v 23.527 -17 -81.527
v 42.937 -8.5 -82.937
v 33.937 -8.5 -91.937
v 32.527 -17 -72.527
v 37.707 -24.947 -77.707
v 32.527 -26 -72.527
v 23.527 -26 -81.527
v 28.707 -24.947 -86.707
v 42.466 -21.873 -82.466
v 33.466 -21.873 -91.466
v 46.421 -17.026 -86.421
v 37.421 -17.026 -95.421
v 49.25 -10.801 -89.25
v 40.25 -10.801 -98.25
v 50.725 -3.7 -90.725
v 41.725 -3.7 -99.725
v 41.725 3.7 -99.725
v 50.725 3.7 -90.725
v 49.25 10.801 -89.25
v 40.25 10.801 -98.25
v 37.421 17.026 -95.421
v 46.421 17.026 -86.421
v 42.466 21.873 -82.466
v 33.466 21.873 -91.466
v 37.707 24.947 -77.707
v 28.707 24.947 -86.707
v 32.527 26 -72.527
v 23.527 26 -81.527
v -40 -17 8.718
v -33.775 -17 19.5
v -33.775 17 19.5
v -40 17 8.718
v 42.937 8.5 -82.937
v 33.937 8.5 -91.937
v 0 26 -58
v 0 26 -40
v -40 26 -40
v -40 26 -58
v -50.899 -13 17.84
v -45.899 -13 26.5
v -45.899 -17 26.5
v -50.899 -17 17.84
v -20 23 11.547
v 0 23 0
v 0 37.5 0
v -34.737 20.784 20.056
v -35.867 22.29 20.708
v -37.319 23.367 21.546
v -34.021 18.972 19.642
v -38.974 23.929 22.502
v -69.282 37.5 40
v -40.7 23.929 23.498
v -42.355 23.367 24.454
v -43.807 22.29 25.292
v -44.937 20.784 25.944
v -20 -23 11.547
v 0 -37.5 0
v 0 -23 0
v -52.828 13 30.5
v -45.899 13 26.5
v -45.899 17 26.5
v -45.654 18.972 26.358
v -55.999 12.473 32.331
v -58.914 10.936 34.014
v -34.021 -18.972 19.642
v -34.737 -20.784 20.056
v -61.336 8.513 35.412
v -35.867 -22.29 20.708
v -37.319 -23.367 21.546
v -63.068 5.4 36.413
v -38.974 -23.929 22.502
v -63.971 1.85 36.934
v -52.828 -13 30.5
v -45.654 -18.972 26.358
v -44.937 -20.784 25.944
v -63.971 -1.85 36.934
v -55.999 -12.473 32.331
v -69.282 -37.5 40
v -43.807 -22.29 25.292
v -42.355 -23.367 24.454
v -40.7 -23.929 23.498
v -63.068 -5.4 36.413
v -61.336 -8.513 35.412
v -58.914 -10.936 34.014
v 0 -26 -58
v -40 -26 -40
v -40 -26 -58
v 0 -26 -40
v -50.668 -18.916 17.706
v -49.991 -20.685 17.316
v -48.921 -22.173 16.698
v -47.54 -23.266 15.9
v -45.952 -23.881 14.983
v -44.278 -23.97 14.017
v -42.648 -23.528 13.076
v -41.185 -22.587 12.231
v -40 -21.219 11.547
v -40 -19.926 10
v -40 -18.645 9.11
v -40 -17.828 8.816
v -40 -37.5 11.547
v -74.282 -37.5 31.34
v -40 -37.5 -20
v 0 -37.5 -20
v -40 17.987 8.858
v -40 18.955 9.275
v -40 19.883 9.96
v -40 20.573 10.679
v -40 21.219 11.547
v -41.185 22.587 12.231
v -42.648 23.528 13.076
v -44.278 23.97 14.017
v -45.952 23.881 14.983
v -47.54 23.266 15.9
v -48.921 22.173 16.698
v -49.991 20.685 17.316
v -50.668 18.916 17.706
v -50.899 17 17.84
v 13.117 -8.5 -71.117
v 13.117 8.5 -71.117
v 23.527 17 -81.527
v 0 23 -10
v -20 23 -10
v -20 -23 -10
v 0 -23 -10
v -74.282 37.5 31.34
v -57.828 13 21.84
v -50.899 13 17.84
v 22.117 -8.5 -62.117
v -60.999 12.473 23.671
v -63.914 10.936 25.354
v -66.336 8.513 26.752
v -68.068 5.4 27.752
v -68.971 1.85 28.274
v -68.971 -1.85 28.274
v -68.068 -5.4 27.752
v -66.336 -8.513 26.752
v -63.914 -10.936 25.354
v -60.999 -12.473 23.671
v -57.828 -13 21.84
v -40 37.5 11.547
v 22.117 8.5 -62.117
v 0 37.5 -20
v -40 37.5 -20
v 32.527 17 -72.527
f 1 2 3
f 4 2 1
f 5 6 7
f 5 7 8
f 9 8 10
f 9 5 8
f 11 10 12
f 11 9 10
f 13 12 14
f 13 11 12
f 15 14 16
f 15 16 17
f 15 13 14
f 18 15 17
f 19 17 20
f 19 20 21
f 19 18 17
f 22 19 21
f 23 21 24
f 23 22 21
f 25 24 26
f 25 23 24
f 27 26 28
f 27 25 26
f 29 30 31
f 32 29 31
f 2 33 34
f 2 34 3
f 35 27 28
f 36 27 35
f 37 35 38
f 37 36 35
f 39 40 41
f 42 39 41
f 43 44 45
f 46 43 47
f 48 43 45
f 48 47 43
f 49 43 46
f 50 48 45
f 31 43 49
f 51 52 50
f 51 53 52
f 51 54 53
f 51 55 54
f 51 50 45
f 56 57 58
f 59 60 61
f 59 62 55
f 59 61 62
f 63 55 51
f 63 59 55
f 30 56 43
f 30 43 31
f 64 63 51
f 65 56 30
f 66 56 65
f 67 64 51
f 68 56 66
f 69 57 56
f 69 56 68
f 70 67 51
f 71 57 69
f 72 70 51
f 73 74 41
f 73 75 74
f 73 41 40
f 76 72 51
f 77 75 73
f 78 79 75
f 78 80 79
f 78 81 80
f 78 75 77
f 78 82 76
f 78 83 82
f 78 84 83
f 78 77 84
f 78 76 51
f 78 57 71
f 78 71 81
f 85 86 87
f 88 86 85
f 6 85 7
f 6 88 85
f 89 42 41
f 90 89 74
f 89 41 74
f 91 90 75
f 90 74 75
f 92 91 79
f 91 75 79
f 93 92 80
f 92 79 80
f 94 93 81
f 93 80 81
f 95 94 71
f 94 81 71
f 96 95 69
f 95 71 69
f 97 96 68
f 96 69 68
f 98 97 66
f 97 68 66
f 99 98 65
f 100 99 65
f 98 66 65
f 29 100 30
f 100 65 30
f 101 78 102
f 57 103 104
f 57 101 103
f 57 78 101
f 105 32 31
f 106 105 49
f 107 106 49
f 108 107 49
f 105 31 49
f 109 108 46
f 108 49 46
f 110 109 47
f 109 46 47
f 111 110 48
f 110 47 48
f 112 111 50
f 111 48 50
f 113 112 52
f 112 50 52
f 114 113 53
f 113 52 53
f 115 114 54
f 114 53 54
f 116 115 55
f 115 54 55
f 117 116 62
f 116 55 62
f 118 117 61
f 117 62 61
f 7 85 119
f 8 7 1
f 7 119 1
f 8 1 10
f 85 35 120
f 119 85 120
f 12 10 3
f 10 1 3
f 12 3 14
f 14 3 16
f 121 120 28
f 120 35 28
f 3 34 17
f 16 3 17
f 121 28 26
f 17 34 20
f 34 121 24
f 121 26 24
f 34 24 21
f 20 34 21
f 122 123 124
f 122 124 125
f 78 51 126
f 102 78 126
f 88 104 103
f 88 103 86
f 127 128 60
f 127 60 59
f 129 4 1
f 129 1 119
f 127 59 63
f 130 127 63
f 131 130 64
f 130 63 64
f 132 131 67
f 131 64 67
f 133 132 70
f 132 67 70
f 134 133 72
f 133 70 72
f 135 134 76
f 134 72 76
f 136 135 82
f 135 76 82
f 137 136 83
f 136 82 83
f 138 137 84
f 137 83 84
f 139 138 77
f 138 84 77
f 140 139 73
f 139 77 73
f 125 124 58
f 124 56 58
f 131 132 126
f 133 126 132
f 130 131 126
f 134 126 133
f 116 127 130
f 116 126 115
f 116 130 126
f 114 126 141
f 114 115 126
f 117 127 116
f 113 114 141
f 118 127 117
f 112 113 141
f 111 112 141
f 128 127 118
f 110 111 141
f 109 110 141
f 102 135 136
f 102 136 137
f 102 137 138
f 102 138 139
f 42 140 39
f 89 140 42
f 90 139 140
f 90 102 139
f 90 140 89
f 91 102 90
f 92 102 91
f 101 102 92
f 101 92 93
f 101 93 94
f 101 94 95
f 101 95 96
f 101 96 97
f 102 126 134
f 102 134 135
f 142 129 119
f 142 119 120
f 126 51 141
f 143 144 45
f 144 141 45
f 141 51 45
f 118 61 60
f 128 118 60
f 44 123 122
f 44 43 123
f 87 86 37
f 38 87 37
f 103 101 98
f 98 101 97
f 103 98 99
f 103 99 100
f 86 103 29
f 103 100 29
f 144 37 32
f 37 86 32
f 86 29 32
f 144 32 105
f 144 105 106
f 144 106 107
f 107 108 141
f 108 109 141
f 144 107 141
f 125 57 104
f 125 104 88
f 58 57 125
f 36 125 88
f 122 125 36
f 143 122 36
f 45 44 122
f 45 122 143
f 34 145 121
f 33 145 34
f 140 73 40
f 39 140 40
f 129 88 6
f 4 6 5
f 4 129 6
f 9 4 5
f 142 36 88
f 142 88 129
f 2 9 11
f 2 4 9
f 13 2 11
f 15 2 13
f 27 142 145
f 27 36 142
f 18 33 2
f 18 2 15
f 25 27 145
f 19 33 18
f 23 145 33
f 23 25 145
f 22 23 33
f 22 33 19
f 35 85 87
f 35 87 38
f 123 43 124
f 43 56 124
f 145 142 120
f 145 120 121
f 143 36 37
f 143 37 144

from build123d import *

# Parameters (mm, degrees)
F1_DEPTH = 37.5
F2_DEPTH = 23
F4_DEPTH = 40
F7_DEPTH = 12.7279220614
F9_DEPTH = 123.6680763069


with BuildPart() as f1:
    # F0 (on Front) → F1 (new body, symmetric)
    with BuildSketch(Plane.XZ):
        Polygon((-40, -20), (0, -20), (0, -10), (-20, -10), (-20, 11.5470053838), (-69.2820323028, 40), (-74.2820323028, 31.3397459622), (-40, 11.5470053838), align=None)
        Polygon((-20, -10), (0, -10), (0, 0), (-20, 11.5470053838), align=None)
    extrude(amount=F1_DEPTH, both=True)

    # F0 (on Front) → F2 (cut, symmetric)
    with BuildSketch(Plane.XZ):
        Polygon((-20, -10), (0, -10), (0, 0), (-20, 11.5470053838), align=None)
    extrude(amount=F2_DEPTH, both=True, mode=Mode.SUBTRACT)

    # F3 (on Right) → F4 (join)
    with BuildSketch(Plane.YZ):
        Polygon((37.5, -20), (-37.5, -20), (-26, -40), (26, -40), align=None)
        Polygon((26, -40), (-26, -40), (-26, -58), (0, -58), (26, -58), align=None)
    extrude(amount=-F4_DEPTH)

    # F6 (on line) → F7 (join, through all)
    with BuildSketch(Plane(origin=(-20, 0, -20), x_dir=(0.7071067812, 0, -0.7071067812), z_dir=(0.7071067812, 0, 0.7071067812))):
        with BuildLine():
            Line((74.2842712475, 26), (28.2842712475, 26))
            Line((28.2842712475, 26), (28.2842712475, -26))
            Line((28.2842712475, -26), (74.2842712475, -26))
            ThreePointArc((74.2842712475, -26), (100.2842712475, 0), (74.2842712475, 26))
        make_face()
        Polygon((59.5618393831, 8.5), (74.2842712475, 17), (89.0067031118, 8.5), (89.0067031118, -8.5), (74.2842712475, -17), (59.5618393831, -8.5), align=None, mode=Mode.SUBTRACT)
    extrude(amount=-F7_DEPTH)

    # F8 (on face) → F9 (cut, through all)
    with BuildSketch(Plane(origin=(0, 0, 0), x_dir=(0.8660254038, 0, -0.5), z_dir=(0.5, 0, 0.8660254038))):
        with BuildLine():
            ThreePointArc((-53, -17), (-46, -24), (-39, -17))
            Line((-39, -17), (-39, 17))
            ThreePointArc((-39, 17), (-46, 24), (-53, 17))
            Line((-53, 17), (-53, 13))
            Line((-53, 13), (-61, 13))
            ThreePointArc((-61, 13), (-74, 0), (-61, -13))
            Line((-61, -13), (-53, -13))
            Line((-53, -13), (-53, -17))
        make_face()
    extrude(amount=-F9_DEPTH, mode=Mode.SUBTRACT)


solid = f1.part
